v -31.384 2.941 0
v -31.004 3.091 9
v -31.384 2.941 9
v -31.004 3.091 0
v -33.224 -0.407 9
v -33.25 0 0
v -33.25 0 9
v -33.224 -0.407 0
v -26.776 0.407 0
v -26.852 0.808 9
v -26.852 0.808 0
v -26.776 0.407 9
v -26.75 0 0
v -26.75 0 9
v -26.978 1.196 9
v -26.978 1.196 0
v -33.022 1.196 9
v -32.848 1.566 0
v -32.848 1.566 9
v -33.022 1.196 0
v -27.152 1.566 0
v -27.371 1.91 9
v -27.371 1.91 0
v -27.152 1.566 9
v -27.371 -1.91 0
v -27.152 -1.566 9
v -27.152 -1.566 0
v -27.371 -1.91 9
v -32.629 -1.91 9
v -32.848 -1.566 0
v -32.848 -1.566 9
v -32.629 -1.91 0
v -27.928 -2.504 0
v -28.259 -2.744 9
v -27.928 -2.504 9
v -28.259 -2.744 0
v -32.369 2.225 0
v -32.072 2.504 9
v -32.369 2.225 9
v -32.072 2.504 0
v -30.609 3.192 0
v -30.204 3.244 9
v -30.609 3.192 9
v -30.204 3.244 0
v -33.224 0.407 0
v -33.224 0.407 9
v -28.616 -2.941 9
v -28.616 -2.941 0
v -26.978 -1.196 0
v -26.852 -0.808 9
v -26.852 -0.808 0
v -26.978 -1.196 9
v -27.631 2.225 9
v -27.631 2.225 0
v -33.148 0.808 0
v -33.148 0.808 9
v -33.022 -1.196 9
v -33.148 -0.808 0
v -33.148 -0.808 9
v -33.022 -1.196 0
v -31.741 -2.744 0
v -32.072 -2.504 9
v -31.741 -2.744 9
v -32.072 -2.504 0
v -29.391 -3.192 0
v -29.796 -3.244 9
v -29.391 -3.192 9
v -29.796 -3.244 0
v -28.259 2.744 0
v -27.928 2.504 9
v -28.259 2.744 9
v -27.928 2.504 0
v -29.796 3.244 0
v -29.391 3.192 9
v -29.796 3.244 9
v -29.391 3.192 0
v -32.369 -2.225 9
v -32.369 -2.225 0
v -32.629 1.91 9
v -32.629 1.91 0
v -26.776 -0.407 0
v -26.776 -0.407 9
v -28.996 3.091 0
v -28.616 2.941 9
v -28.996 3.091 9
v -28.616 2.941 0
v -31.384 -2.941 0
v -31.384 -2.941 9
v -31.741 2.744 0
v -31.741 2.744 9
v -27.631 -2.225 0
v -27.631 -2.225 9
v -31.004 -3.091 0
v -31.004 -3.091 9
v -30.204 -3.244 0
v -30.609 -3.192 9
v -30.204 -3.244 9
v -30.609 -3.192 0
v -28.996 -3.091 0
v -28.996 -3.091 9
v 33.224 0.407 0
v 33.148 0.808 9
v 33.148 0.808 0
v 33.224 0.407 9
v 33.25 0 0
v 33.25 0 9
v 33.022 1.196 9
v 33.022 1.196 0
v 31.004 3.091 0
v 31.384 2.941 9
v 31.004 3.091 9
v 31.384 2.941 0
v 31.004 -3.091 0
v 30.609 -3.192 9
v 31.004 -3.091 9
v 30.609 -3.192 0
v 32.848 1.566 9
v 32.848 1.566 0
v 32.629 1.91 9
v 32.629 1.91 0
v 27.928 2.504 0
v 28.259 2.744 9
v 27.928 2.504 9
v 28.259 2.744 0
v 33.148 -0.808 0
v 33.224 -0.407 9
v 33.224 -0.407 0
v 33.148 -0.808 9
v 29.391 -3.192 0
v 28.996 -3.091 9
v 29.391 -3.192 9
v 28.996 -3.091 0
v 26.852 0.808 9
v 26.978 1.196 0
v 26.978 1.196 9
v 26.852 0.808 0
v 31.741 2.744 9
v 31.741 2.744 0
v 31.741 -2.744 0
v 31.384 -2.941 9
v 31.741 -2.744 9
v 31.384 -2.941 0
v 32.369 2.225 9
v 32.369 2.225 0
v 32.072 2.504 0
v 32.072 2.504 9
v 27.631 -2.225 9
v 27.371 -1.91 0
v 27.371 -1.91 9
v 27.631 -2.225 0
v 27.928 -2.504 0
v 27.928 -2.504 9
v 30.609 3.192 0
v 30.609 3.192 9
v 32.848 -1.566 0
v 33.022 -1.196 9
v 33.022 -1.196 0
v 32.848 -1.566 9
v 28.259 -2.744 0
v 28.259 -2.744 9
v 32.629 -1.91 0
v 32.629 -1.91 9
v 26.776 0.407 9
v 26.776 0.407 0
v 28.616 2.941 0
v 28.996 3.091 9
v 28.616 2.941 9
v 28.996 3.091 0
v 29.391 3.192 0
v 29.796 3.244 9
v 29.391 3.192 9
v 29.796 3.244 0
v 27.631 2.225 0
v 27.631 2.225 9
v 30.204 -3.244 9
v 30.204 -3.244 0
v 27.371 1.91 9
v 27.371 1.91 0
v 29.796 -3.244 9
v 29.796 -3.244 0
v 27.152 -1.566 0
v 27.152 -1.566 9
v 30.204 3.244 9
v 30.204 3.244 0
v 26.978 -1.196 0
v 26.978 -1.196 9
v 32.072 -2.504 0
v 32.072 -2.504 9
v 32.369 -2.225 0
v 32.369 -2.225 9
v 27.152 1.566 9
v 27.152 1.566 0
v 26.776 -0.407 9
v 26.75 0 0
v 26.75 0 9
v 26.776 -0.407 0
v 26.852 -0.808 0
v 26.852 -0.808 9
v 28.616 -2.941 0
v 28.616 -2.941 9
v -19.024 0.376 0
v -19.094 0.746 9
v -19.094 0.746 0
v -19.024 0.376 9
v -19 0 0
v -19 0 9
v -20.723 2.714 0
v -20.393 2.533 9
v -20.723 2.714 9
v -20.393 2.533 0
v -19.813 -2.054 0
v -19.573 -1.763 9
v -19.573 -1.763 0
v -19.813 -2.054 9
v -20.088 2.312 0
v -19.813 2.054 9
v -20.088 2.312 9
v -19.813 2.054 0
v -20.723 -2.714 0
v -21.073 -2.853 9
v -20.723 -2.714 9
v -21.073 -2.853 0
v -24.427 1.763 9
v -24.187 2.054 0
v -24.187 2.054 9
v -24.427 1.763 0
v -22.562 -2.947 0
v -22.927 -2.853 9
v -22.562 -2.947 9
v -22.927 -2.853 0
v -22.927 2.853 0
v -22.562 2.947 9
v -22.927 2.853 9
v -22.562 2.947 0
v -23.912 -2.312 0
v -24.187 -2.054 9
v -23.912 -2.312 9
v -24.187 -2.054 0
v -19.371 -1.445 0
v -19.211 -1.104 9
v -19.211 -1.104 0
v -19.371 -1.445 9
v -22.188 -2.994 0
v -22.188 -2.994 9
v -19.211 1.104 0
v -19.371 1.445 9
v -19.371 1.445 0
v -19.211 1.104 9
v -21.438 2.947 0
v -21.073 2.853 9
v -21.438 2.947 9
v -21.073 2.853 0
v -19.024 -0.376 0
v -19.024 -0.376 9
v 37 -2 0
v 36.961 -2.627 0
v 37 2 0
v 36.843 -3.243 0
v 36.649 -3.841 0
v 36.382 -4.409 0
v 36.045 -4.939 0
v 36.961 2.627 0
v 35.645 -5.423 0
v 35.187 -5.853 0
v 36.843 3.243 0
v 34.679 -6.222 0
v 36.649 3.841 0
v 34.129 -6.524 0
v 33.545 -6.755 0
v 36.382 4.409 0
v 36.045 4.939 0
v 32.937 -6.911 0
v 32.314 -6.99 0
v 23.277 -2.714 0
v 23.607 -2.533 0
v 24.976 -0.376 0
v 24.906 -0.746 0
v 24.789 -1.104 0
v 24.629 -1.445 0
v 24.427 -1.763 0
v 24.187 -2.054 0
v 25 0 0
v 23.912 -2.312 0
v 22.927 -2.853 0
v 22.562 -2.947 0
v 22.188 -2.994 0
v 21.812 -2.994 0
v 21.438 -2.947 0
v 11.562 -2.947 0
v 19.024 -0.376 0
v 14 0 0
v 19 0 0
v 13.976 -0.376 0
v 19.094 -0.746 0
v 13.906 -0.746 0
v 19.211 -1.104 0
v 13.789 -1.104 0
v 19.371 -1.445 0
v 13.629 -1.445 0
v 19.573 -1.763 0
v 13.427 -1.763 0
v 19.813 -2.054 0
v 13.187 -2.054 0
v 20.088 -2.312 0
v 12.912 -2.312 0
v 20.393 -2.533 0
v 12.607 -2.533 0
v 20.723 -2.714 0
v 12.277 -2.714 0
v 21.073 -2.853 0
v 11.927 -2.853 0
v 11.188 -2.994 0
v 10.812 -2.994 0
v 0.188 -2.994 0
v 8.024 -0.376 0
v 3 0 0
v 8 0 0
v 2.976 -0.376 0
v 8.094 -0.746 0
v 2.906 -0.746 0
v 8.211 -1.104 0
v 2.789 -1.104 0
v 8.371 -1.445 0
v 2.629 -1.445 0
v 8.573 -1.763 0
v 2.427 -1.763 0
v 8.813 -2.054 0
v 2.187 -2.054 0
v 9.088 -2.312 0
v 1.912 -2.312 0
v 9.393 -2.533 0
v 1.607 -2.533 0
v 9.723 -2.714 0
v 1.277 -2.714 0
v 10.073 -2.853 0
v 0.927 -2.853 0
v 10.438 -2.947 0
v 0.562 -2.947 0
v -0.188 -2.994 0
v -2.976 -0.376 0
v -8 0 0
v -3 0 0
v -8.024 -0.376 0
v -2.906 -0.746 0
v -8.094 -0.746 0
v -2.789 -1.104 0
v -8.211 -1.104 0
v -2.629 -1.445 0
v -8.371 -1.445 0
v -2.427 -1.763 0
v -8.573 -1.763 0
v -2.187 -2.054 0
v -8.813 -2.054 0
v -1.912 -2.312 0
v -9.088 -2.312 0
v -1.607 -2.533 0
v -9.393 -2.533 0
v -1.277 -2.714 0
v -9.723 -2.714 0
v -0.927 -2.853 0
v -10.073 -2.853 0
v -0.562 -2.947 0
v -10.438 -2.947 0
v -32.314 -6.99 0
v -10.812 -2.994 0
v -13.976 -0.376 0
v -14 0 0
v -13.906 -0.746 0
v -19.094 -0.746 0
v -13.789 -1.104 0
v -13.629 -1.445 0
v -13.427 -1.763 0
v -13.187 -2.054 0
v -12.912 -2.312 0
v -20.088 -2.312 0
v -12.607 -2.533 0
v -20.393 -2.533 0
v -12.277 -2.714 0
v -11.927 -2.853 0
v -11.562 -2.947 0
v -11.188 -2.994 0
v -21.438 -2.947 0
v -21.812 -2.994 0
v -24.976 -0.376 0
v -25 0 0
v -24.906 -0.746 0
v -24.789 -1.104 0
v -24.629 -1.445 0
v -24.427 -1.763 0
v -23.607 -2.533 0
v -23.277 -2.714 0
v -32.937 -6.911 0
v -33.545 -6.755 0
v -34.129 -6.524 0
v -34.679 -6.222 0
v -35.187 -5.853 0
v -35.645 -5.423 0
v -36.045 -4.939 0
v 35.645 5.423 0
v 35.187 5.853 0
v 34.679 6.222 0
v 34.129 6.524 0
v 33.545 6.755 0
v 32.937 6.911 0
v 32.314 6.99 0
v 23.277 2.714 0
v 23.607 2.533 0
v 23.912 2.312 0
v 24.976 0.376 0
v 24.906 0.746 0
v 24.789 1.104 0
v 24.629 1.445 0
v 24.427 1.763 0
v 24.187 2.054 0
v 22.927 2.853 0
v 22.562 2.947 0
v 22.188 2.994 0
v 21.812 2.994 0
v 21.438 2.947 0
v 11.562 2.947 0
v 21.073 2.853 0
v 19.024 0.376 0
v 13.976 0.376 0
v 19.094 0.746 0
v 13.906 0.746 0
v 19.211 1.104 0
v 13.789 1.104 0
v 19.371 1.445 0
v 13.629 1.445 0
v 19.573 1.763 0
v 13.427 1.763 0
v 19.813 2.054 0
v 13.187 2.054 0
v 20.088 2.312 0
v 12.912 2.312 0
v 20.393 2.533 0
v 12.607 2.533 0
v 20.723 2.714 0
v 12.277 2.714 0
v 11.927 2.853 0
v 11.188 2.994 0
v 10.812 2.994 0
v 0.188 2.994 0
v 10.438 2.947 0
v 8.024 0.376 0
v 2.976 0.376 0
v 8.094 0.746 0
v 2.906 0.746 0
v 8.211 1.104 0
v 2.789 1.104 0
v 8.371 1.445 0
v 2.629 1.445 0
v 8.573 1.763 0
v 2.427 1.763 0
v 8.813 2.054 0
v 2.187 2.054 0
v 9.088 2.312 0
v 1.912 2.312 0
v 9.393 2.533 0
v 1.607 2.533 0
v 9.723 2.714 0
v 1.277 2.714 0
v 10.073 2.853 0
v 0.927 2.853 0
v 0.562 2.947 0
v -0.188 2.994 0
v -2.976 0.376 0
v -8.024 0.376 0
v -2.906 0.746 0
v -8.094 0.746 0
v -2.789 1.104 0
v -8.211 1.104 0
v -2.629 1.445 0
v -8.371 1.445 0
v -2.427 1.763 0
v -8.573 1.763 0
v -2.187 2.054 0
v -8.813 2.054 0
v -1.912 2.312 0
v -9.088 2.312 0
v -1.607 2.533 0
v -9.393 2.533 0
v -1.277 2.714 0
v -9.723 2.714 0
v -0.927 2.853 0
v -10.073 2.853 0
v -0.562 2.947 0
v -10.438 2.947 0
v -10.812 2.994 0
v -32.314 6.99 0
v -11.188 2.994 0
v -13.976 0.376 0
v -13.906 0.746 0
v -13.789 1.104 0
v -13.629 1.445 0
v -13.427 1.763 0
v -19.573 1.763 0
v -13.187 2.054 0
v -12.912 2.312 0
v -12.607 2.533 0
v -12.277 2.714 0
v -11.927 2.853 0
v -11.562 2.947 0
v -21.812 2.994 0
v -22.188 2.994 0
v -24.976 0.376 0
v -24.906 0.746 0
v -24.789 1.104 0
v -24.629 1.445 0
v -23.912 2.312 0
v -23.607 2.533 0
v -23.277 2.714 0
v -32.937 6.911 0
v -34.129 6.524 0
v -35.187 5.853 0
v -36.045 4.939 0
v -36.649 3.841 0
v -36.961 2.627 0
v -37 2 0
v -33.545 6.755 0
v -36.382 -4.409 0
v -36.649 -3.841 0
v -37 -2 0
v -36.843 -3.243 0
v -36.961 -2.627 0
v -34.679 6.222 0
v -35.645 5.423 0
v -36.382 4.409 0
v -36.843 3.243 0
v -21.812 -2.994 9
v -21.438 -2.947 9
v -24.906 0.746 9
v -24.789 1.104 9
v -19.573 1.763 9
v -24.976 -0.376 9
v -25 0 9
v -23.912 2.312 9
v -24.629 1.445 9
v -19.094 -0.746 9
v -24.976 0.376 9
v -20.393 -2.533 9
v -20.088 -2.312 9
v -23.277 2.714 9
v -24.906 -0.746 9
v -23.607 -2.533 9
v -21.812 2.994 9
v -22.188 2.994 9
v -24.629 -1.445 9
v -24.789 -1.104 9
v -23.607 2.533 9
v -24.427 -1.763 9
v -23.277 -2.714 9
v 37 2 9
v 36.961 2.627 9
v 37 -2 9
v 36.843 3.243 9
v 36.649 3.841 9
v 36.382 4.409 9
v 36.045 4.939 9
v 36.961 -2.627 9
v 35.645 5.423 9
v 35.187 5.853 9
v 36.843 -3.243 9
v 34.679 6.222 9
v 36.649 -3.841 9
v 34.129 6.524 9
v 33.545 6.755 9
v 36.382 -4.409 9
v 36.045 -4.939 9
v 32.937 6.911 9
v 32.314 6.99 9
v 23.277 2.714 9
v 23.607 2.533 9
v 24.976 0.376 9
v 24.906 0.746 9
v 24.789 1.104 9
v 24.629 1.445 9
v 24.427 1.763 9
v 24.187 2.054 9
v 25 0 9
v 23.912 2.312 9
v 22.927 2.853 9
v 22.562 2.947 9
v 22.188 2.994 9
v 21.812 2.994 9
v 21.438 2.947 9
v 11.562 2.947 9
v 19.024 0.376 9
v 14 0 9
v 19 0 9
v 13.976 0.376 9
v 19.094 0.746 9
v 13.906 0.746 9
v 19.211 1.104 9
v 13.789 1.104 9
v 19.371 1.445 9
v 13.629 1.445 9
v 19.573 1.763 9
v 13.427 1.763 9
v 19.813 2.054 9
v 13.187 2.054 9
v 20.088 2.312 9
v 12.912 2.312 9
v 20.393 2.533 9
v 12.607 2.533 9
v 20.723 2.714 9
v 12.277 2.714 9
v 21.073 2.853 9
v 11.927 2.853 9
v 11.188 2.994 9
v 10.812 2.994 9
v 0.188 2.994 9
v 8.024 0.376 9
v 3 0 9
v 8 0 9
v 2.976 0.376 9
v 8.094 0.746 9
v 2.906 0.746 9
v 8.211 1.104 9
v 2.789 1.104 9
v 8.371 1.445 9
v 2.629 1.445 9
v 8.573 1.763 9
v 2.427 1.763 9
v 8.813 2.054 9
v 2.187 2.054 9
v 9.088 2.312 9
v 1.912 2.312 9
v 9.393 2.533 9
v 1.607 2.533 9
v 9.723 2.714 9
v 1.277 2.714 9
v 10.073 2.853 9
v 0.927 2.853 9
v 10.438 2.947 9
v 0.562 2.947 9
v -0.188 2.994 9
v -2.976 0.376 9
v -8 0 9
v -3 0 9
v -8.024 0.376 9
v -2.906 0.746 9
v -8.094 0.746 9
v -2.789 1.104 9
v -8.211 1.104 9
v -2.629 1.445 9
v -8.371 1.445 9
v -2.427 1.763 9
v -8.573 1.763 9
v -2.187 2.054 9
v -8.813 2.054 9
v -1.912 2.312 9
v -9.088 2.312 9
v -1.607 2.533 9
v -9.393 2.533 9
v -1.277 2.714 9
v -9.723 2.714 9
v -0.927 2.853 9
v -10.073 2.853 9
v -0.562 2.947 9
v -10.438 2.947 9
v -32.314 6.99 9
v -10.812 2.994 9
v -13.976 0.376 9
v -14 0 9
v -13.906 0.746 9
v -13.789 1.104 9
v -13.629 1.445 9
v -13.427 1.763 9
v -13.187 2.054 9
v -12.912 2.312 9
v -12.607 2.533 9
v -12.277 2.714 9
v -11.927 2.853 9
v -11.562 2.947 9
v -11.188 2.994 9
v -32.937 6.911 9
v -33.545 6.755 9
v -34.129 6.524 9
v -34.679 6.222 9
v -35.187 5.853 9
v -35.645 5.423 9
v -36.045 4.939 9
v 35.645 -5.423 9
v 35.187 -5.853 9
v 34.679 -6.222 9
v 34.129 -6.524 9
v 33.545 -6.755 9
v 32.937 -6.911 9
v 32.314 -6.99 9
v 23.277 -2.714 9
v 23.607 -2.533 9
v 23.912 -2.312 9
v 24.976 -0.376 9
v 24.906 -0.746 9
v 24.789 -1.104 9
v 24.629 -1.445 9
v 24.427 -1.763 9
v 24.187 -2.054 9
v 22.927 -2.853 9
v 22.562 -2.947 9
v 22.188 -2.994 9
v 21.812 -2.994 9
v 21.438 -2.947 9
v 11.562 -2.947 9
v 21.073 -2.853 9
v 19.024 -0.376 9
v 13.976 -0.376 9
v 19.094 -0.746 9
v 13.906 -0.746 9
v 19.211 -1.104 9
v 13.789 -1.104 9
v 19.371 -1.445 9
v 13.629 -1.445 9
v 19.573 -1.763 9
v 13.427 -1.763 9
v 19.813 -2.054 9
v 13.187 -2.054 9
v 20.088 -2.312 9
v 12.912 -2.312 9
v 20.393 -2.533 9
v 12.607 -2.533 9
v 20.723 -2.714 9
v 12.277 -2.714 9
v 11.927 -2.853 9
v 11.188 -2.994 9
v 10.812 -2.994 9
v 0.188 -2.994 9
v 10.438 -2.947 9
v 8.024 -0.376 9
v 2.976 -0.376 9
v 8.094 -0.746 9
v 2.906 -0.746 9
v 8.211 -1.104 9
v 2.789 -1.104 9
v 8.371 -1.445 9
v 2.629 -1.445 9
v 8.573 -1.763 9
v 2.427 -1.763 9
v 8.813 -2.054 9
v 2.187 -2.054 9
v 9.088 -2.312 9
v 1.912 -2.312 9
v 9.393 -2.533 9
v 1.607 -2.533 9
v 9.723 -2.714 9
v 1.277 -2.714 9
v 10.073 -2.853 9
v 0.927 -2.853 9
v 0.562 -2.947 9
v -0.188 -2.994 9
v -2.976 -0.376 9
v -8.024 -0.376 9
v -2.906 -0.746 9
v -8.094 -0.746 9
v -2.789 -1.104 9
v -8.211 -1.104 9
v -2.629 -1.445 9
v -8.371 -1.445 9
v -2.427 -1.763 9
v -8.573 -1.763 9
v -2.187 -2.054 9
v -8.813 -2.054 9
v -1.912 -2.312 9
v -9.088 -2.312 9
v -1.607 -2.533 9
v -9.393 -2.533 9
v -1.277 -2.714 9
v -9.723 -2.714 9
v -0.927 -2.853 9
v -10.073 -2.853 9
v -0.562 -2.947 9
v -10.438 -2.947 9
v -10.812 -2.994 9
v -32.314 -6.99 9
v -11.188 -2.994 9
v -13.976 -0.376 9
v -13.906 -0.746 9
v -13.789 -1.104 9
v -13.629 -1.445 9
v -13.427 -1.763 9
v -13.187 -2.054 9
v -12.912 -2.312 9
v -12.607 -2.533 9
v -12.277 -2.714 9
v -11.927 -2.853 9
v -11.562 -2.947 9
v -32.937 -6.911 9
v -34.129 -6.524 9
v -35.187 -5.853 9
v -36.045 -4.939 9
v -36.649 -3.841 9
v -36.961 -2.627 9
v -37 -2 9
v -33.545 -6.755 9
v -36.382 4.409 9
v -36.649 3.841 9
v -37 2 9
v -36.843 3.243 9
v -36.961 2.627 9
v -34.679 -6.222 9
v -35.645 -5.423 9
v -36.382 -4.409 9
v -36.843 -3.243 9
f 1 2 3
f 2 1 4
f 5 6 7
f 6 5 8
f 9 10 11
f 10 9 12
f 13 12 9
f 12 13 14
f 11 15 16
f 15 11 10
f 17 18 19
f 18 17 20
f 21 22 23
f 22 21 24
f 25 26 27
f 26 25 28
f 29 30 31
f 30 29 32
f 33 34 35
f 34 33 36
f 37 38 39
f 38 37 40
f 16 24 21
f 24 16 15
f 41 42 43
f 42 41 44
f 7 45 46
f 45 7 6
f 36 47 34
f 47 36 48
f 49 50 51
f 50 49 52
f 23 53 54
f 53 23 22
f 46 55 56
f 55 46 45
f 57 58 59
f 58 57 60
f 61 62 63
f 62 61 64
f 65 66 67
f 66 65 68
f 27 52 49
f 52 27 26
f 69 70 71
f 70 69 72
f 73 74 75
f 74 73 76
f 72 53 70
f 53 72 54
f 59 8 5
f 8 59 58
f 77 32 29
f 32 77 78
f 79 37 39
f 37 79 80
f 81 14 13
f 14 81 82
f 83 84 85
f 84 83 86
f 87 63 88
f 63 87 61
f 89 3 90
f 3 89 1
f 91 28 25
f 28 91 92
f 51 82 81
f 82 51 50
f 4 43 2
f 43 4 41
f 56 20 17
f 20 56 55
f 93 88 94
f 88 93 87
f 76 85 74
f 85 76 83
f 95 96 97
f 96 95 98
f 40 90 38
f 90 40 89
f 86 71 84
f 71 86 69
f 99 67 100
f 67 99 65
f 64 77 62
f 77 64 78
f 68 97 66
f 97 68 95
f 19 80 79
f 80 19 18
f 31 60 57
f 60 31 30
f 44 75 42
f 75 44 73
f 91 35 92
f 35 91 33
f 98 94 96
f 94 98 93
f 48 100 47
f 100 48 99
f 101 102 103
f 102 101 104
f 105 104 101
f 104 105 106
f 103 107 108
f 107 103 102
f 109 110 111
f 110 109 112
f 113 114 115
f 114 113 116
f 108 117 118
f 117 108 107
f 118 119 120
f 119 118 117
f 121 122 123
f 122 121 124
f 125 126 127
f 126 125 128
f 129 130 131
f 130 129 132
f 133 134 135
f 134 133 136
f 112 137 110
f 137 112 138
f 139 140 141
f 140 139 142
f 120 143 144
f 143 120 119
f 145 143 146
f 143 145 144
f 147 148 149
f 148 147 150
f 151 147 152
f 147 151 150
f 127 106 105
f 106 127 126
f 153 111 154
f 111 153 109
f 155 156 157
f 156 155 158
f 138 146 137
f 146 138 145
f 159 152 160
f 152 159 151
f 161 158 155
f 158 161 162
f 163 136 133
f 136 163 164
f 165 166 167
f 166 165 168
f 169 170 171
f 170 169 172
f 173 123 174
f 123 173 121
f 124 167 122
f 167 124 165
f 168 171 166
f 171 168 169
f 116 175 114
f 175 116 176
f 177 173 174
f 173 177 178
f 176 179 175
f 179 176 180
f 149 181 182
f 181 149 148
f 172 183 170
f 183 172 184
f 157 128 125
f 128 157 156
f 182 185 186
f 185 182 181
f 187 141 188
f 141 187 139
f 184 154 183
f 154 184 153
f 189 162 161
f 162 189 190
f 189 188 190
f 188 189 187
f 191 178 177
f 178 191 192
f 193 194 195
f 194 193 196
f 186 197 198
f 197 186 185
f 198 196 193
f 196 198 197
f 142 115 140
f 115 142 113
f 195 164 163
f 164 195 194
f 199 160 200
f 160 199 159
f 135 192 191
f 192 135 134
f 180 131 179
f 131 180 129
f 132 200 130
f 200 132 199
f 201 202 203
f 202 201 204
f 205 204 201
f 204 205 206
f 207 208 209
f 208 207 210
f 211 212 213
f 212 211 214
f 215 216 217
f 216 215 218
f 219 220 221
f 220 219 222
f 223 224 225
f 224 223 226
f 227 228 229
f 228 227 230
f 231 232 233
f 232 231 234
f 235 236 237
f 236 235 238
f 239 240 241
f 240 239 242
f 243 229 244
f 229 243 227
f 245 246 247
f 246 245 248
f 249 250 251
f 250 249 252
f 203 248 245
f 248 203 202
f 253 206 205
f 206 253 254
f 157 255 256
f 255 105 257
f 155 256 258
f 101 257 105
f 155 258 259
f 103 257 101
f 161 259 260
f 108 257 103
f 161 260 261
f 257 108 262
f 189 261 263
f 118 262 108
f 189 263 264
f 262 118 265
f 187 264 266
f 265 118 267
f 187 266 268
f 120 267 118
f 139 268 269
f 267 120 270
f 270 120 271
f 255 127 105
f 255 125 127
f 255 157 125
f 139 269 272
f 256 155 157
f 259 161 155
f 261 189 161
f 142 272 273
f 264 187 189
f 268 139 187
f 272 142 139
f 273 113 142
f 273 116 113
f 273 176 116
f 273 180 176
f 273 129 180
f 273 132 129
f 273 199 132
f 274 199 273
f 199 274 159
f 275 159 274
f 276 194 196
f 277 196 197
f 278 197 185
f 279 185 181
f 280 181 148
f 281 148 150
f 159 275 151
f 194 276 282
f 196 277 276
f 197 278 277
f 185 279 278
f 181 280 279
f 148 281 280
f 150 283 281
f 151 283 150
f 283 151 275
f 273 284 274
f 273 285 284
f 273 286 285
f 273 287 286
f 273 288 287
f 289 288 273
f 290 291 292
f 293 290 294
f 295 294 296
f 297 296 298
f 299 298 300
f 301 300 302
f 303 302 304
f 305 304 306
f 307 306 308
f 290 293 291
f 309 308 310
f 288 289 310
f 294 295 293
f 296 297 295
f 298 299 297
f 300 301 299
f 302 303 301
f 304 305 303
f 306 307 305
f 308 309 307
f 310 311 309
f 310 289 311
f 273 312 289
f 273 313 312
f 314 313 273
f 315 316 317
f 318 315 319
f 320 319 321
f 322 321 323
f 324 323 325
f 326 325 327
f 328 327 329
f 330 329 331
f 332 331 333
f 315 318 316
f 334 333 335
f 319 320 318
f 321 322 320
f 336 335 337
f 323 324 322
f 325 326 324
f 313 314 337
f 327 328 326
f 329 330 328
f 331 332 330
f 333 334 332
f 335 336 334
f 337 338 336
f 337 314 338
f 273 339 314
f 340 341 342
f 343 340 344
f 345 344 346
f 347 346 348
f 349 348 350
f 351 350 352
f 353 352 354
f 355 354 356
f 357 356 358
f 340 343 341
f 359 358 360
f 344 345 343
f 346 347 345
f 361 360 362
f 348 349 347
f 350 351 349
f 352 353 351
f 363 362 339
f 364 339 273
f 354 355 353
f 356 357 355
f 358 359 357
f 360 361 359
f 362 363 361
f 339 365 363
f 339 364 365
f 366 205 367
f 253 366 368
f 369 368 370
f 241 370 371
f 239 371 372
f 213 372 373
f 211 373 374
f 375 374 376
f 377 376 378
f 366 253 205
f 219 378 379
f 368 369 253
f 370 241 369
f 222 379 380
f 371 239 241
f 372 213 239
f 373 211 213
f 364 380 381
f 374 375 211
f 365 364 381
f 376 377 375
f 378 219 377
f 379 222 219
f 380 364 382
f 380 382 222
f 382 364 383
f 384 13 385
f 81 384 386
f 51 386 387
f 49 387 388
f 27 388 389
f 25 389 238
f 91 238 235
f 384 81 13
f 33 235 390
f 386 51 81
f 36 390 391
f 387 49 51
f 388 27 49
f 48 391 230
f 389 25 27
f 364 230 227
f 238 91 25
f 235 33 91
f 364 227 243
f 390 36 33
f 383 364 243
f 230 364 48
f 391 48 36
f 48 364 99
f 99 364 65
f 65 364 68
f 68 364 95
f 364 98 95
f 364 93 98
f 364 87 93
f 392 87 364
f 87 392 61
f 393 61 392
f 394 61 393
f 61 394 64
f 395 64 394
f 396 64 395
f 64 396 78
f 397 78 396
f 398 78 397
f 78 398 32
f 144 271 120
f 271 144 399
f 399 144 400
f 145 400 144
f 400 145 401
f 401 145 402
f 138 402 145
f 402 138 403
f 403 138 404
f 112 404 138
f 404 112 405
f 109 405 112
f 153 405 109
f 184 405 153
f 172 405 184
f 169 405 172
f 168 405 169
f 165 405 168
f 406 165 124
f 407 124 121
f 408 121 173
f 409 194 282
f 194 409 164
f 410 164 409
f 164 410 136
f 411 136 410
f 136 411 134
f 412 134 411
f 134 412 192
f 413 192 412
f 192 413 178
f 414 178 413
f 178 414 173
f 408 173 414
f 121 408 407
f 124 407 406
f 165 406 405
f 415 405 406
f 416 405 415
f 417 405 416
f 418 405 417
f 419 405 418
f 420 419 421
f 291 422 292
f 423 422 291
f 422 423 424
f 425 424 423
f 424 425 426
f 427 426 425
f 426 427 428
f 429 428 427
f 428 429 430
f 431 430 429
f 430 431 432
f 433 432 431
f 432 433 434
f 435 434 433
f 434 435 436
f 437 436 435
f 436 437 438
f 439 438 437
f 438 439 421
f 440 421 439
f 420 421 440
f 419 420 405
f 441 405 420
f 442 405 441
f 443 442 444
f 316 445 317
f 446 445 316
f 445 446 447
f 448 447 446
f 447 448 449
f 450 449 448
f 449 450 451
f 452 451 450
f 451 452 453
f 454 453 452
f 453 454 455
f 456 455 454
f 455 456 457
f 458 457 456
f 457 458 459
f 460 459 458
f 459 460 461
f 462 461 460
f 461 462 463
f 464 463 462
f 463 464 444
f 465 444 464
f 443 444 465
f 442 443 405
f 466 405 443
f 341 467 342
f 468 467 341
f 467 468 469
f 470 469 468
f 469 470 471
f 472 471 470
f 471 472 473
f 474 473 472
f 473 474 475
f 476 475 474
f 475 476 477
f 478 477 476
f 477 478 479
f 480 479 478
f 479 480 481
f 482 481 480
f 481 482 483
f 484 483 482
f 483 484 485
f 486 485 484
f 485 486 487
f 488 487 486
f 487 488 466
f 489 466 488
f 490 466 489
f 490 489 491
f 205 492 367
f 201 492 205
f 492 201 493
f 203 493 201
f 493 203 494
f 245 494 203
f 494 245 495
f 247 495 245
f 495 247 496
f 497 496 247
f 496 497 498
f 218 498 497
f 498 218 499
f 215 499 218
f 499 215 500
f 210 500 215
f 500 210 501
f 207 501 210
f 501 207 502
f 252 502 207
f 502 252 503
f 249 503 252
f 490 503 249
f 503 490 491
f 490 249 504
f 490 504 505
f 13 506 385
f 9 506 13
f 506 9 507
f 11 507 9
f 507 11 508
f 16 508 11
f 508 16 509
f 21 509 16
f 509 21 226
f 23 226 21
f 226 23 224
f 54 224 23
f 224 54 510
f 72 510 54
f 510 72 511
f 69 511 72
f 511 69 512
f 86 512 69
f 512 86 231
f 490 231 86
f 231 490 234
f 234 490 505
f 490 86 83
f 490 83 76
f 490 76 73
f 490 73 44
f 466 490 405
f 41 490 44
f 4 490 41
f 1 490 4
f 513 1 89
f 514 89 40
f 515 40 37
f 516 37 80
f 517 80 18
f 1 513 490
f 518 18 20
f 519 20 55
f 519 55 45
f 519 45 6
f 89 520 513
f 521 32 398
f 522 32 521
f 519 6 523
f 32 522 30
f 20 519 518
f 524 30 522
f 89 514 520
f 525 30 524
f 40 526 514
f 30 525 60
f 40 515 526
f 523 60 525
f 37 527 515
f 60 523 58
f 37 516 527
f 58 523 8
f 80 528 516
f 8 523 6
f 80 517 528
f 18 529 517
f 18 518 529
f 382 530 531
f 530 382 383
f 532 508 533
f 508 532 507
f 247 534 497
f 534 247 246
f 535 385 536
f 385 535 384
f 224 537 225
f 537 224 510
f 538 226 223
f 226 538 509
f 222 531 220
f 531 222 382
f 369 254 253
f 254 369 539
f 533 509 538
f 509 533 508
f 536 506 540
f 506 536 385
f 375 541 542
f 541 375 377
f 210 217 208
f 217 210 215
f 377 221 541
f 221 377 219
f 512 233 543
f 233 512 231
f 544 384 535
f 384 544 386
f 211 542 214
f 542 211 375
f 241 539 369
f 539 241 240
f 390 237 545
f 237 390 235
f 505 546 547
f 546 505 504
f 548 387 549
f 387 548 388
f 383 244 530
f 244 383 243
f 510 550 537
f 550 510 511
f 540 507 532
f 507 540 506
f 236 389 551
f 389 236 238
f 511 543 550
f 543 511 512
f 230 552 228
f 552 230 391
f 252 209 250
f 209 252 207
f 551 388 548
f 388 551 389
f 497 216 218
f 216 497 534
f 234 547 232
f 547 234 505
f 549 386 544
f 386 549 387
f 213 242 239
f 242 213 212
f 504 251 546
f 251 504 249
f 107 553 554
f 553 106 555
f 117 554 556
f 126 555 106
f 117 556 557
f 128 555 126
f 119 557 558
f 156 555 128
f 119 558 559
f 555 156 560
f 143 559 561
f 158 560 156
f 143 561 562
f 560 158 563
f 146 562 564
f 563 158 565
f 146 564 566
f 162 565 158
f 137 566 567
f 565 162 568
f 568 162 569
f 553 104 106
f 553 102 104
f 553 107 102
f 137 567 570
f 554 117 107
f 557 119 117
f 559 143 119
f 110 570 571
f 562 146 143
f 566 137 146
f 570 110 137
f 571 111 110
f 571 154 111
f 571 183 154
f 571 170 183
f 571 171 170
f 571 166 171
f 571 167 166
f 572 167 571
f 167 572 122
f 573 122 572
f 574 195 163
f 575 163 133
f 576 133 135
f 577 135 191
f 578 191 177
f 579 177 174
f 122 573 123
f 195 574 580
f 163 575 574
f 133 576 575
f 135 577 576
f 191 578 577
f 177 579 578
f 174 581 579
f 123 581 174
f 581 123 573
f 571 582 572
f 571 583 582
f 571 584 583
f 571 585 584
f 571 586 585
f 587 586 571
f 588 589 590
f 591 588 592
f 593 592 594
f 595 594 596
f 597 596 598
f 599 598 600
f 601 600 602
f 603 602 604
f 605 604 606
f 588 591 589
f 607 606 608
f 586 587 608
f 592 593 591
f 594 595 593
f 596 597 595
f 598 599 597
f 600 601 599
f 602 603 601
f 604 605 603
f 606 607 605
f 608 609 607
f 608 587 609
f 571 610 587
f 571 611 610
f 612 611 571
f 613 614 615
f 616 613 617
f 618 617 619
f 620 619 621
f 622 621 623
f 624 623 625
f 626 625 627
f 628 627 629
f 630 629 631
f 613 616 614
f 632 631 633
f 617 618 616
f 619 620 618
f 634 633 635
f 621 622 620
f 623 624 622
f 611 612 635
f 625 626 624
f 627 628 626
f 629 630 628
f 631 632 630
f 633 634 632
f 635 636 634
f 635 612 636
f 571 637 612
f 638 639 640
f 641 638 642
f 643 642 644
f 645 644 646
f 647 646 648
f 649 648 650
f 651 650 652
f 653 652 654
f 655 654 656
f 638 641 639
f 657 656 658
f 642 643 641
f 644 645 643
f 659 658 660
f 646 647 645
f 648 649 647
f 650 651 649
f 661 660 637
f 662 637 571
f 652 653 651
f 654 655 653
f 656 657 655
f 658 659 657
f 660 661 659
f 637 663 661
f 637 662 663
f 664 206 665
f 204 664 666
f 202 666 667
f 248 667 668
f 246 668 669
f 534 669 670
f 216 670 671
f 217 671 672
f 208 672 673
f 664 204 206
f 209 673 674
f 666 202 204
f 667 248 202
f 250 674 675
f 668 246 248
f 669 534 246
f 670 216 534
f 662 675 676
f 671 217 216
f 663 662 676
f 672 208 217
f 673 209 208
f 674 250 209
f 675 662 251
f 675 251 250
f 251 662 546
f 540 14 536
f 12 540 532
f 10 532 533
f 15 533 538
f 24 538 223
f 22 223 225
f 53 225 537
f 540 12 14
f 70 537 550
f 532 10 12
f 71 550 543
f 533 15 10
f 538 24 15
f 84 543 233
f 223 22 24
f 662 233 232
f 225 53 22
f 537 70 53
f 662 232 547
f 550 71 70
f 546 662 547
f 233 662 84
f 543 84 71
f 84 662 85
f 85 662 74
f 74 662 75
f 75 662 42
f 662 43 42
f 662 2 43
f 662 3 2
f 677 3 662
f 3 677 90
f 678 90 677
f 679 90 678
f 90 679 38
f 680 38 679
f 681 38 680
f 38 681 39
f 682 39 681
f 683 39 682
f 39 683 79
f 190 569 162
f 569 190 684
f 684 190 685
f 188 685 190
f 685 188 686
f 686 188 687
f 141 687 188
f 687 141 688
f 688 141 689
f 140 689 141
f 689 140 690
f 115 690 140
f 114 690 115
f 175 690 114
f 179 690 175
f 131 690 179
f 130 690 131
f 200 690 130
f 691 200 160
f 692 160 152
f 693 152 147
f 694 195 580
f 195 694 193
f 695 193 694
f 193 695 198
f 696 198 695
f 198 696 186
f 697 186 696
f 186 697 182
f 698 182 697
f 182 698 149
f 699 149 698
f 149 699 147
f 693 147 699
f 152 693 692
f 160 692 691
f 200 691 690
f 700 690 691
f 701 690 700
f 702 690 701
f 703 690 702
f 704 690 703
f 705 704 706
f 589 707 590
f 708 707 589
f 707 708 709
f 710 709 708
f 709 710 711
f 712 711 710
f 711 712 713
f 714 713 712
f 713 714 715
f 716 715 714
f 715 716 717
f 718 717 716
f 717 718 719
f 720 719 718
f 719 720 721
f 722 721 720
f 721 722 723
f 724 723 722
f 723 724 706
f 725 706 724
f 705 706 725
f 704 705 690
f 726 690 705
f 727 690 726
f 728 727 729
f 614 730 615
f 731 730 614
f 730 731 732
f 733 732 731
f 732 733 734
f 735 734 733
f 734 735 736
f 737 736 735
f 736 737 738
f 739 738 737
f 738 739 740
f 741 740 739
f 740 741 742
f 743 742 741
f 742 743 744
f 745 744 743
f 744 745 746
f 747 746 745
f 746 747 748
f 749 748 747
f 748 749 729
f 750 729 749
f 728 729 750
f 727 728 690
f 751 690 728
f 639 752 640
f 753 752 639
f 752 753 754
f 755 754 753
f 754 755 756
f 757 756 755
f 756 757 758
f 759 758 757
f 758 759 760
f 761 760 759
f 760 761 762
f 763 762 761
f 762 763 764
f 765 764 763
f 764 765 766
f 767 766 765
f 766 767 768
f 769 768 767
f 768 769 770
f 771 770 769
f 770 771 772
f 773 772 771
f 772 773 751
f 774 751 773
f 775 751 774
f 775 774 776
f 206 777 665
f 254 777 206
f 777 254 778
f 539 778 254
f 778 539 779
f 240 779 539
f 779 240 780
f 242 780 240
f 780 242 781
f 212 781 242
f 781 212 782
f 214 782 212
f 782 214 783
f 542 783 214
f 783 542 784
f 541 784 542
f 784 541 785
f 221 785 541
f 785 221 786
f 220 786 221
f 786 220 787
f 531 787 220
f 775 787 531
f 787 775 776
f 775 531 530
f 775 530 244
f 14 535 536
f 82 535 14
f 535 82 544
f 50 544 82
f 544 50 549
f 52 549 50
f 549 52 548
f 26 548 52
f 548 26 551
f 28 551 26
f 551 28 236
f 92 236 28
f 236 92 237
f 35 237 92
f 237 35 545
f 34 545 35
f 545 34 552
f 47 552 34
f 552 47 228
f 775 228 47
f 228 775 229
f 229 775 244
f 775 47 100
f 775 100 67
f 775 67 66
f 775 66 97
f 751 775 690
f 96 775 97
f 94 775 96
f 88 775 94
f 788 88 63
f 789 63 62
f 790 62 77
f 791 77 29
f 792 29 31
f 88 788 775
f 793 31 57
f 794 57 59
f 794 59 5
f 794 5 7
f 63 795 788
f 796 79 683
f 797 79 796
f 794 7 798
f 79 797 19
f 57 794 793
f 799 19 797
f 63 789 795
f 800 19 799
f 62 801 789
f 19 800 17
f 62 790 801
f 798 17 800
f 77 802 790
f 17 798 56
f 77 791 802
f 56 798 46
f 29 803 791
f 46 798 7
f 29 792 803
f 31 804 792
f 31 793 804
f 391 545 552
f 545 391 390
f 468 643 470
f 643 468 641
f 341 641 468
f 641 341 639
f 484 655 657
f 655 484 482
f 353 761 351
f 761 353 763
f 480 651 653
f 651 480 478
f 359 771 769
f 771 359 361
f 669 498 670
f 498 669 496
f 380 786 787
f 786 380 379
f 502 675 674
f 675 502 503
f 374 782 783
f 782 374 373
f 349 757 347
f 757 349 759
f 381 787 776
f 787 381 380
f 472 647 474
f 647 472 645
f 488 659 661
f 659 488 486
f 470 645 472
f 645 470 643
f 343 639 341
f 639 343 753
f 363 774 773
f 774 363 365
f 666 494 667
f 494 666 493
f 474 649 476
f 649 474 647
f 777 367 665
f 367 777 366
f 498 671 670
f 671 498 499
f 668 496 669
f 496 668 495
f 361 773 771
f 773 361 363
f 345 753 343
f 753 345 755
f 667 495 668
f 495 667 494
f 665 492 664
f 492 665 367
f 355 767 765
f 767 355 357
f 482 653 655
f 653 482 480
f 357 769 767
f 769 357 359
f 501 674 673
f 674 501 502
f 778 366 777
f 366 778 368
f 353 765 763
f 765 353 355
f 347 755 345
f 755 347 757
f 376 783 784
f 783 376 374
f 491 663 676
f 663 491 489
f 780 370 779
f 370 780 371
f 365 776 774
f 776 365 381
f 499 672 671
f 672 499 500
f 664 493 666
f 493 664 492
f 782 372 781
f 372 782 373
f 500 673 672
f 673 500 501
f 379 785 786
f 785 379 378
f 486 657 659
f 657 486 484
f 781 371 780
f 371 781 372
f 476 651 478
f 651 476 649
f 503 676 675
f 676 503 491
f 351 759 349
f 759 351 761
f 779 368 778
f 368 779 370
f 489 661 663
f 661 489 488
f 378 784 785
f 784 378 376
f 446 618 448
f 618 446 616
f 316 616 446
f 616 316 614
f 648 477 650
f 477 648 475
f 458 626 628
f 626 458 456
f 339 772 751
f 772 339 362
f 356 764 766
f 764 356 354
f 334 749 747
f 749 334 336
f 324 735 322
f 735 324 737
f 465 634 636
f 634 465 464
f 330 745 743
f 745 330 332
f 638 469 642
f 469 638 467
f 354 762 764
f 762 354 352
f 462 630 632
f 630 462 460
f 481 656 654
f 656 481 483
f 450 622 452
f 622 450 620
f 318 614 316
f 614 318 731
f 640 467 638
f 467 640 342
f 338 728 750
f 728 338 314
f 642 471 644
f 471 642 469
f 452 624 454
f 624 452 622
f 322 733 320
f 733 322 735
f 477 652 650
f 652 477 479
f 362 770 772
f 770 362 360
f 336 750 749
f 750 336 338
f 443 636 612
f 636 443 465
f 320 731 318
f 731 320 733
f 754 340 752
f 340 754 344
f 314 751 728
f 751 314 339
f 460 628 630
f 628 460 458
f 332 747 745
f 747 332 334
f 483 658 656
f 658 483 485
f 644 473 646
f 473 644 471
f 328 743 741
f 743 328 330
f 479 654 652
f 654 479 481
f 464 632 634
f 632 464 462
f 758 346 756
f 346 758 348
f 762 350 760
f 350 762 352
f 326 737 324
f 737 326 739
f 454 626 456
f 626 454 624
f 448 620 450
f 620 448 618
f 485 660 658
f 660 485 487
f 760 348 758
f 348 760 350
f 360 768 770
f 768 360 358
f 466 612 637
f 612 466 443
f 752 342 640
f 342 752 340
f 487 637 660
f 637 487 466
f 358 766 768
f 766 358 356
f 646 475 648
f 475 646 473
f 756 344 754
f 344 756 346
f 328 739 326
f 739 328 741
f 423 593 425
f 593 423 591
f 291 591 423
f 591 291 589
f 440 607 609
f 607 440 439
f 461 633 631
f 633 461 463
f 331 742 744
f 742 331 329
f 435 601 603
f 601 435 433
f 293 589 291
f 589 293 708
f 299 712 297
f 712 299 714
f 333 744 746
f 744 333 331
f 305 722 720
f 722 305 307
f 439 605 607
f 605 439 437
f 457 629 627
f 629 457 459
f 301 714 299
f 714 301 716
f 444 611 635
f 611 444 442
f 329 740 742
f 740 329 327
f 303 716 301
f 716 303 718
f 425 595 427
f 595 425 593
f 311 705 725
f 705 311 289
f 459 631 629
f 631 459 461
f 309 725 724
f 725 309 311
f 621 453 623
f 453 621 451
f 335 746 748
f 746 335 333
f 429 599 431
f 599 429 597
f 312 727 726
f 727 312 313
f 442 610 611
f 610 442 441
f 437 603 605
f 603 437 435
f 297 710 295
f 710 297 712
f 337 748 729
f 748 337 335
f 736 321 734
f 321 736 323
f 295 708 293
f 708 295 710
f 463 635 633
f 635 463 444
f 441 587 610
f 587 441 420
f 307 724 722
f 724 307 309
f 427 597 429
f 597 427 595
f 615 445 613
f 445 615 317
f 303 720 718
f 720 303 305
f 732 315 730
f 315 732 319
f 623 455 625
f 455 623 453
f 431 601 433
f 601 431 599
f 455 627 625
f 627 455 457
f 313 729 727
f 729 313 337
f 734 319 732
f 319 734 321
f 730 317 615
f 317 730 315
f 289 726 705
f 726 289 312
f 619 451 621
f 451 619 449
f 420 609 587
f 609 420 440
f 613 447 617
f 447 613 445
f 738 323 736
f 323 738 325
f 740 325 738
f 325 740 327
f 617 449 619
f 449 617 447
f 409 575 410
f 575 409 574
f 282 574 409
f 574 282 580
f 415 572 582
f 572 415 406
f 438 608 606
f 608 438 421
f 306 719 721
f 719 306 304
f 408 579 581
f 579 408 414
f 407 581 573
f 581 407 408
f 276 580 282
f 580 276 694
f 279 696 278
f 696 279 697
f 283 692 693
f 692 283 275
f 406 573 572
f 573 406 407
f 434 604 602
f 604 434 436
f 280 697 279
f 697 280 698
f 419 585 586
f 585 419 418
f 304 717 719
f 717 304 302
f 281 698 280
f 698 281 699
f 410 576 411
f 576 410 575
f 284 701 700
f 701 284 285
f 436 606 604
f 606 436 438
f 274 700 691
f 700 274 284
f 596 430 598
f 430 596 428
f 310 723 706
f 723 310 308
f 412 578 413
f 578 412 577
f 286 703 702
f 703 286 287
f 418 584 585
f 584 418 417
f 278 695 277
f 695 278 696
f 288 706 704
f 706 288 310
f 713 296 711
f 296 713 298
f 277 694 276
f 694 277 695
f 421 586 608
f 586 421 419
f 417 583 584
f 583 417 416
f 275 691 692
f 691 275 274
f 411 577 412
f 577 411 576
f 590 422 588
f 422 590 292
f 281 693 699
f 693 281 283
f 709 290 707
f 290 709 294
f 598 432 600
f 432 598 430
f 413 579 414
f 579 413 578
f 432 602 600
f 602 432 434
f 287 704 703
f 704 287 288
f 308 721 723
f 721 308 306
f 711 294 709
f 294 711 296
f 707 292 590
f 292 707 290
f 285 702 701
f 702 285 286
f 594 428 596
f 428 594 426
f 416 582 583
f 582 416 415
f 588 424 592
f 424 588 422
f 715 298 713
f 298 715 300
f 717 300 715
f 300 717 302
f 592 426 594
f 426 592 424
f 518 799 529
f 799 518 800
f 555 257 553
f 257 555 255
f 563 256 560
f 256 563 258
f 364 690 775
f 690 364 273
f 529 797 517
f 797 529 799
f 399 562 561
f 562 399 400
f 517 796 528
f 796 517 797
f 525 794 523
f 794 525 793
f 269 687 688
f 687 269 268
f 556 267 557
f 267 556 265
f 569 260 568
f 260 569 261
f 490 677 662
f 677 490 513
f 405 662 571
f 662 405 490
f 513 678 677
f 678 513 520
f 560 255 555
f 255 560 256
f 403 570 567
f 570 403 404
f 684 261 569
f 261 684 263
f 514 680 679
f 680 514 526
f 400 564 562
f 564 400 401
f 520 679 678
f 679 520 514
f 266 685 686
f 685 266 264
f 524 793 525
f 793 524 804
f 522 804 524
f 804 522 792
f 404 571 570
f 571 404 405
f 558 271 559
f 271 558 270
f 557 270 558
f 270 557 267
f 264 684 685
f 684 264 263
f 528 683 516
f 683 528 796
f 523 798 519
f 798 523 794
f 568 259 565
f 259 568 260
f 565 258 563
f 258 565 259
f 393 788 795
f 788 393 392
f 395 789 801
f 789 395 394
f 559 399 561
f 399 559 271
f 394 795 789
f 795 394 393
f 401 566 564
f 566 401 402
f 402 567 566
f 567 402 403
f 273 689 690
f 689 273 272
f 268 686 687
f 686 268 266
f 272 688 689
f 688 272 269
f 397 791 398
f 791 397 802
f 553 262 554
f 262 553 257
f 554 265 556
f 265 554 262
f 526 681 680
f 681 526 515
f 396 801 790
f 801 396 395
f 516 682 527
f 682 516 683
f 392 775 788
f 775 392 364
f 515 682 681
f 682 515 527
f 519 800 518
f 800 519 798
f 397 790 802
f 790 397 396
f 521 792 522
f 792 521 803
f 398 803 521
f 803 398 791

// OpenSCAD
$fn = 50;


difference() {
	union() {
		hull() {
			translate(v = [-32.0000000000, 2.0000000000, 0]) {
				cylinder(h = 9, r = 5);
			}
			translate(v = [32.0000000000, 2.0000000000, 0]) {
				cylinder(h = 9, r = 5);
			}
			translate(v = [-32.0000000000, -2.0000000000, 0]) {
				cylinder(h = 9, r = 5);
			}
			translate(v = [32.0000000000, -2.0000000000, 0]) {
				cylinder(h = 9, r = 5);
			}
		}
	}
	union() {
		#translate(v = [-30.0000000000, 0.0000000000, 0]) {
			cylinder(h = 9, r = 3.2500000000);
		}
		#translate(v = [30.0000000000, 0.0000000000, 0]) {
			cylinder(h = 9, r = 3.2500000000);
		}
		#translate(v = [-30.0000000000, 0.0000000000, -100.0000000000]) {
			cylinder(h = 200, r = 3.2500000000);
		}
		#translate(v = [-30.0000000000, 0.0000000000, -100.0000000000]) {
			cylinder(h = 200, r = 3.2500000000);
		}
		#translate(v = [30.0000000000, 0.0000000000, -100.0000000000]) {
			cylinder(h = 200, r = 3.2500000000);
		}
		#translate(v = [30.0000000000, 0.0000000000, -100.0000000000]) {
			cylinder(h = 200, r = 3.2500000000);
		}
		#translate(v = [-30.0000000000, 0.0000000000, 0]) {
			cylinder(h = 9, r = 1.8000000000);
		}
		#translate(v = [30.0000000000, 0.0000000000, 0]) {
			cylinder(h = 9, r = 1.8000000000);
		}
		#translate(v = [-30.0000000000, 0.0000000000, 0]) {
			cylinder(h = 9, r = 1.8000000000);
		}
		#translate(v = [30.0000000000, 0.0000000000, 0]) {
			cylinder(h = 9, r = 1.8000000000);
		}
		#translate(v = [-30.0000000000, 0.0000000000, 0]) {
			cylinder(h = 9, r = 1.8000000000);
		}
		#translate(v = [30.0000000000, 0.0000000000, 0]) {
			cylinder(h = 9, r = 1.8000000000);
		}
		#translate(v = [-22.0000000000, 0, 0]) {
			cylinder(h = 9, r = 3.0000000000);
		}
		#translate(v = [-11.0000000000, 0, 0]) {
			cylinder(h = 9, r = 3.0000000000);
		}
		#cylinder(h = 9, r = 3.0000000000);
		#translate(v = [11.0000000000, 0, 0]) {
			cylinder(h = 9, r = 3.0000000000);
		}
		#translate(v = [22.0000000000, 0, 0]) {
			cylinder(h = 9, r = 3.0000000000);
		}
	}
}
